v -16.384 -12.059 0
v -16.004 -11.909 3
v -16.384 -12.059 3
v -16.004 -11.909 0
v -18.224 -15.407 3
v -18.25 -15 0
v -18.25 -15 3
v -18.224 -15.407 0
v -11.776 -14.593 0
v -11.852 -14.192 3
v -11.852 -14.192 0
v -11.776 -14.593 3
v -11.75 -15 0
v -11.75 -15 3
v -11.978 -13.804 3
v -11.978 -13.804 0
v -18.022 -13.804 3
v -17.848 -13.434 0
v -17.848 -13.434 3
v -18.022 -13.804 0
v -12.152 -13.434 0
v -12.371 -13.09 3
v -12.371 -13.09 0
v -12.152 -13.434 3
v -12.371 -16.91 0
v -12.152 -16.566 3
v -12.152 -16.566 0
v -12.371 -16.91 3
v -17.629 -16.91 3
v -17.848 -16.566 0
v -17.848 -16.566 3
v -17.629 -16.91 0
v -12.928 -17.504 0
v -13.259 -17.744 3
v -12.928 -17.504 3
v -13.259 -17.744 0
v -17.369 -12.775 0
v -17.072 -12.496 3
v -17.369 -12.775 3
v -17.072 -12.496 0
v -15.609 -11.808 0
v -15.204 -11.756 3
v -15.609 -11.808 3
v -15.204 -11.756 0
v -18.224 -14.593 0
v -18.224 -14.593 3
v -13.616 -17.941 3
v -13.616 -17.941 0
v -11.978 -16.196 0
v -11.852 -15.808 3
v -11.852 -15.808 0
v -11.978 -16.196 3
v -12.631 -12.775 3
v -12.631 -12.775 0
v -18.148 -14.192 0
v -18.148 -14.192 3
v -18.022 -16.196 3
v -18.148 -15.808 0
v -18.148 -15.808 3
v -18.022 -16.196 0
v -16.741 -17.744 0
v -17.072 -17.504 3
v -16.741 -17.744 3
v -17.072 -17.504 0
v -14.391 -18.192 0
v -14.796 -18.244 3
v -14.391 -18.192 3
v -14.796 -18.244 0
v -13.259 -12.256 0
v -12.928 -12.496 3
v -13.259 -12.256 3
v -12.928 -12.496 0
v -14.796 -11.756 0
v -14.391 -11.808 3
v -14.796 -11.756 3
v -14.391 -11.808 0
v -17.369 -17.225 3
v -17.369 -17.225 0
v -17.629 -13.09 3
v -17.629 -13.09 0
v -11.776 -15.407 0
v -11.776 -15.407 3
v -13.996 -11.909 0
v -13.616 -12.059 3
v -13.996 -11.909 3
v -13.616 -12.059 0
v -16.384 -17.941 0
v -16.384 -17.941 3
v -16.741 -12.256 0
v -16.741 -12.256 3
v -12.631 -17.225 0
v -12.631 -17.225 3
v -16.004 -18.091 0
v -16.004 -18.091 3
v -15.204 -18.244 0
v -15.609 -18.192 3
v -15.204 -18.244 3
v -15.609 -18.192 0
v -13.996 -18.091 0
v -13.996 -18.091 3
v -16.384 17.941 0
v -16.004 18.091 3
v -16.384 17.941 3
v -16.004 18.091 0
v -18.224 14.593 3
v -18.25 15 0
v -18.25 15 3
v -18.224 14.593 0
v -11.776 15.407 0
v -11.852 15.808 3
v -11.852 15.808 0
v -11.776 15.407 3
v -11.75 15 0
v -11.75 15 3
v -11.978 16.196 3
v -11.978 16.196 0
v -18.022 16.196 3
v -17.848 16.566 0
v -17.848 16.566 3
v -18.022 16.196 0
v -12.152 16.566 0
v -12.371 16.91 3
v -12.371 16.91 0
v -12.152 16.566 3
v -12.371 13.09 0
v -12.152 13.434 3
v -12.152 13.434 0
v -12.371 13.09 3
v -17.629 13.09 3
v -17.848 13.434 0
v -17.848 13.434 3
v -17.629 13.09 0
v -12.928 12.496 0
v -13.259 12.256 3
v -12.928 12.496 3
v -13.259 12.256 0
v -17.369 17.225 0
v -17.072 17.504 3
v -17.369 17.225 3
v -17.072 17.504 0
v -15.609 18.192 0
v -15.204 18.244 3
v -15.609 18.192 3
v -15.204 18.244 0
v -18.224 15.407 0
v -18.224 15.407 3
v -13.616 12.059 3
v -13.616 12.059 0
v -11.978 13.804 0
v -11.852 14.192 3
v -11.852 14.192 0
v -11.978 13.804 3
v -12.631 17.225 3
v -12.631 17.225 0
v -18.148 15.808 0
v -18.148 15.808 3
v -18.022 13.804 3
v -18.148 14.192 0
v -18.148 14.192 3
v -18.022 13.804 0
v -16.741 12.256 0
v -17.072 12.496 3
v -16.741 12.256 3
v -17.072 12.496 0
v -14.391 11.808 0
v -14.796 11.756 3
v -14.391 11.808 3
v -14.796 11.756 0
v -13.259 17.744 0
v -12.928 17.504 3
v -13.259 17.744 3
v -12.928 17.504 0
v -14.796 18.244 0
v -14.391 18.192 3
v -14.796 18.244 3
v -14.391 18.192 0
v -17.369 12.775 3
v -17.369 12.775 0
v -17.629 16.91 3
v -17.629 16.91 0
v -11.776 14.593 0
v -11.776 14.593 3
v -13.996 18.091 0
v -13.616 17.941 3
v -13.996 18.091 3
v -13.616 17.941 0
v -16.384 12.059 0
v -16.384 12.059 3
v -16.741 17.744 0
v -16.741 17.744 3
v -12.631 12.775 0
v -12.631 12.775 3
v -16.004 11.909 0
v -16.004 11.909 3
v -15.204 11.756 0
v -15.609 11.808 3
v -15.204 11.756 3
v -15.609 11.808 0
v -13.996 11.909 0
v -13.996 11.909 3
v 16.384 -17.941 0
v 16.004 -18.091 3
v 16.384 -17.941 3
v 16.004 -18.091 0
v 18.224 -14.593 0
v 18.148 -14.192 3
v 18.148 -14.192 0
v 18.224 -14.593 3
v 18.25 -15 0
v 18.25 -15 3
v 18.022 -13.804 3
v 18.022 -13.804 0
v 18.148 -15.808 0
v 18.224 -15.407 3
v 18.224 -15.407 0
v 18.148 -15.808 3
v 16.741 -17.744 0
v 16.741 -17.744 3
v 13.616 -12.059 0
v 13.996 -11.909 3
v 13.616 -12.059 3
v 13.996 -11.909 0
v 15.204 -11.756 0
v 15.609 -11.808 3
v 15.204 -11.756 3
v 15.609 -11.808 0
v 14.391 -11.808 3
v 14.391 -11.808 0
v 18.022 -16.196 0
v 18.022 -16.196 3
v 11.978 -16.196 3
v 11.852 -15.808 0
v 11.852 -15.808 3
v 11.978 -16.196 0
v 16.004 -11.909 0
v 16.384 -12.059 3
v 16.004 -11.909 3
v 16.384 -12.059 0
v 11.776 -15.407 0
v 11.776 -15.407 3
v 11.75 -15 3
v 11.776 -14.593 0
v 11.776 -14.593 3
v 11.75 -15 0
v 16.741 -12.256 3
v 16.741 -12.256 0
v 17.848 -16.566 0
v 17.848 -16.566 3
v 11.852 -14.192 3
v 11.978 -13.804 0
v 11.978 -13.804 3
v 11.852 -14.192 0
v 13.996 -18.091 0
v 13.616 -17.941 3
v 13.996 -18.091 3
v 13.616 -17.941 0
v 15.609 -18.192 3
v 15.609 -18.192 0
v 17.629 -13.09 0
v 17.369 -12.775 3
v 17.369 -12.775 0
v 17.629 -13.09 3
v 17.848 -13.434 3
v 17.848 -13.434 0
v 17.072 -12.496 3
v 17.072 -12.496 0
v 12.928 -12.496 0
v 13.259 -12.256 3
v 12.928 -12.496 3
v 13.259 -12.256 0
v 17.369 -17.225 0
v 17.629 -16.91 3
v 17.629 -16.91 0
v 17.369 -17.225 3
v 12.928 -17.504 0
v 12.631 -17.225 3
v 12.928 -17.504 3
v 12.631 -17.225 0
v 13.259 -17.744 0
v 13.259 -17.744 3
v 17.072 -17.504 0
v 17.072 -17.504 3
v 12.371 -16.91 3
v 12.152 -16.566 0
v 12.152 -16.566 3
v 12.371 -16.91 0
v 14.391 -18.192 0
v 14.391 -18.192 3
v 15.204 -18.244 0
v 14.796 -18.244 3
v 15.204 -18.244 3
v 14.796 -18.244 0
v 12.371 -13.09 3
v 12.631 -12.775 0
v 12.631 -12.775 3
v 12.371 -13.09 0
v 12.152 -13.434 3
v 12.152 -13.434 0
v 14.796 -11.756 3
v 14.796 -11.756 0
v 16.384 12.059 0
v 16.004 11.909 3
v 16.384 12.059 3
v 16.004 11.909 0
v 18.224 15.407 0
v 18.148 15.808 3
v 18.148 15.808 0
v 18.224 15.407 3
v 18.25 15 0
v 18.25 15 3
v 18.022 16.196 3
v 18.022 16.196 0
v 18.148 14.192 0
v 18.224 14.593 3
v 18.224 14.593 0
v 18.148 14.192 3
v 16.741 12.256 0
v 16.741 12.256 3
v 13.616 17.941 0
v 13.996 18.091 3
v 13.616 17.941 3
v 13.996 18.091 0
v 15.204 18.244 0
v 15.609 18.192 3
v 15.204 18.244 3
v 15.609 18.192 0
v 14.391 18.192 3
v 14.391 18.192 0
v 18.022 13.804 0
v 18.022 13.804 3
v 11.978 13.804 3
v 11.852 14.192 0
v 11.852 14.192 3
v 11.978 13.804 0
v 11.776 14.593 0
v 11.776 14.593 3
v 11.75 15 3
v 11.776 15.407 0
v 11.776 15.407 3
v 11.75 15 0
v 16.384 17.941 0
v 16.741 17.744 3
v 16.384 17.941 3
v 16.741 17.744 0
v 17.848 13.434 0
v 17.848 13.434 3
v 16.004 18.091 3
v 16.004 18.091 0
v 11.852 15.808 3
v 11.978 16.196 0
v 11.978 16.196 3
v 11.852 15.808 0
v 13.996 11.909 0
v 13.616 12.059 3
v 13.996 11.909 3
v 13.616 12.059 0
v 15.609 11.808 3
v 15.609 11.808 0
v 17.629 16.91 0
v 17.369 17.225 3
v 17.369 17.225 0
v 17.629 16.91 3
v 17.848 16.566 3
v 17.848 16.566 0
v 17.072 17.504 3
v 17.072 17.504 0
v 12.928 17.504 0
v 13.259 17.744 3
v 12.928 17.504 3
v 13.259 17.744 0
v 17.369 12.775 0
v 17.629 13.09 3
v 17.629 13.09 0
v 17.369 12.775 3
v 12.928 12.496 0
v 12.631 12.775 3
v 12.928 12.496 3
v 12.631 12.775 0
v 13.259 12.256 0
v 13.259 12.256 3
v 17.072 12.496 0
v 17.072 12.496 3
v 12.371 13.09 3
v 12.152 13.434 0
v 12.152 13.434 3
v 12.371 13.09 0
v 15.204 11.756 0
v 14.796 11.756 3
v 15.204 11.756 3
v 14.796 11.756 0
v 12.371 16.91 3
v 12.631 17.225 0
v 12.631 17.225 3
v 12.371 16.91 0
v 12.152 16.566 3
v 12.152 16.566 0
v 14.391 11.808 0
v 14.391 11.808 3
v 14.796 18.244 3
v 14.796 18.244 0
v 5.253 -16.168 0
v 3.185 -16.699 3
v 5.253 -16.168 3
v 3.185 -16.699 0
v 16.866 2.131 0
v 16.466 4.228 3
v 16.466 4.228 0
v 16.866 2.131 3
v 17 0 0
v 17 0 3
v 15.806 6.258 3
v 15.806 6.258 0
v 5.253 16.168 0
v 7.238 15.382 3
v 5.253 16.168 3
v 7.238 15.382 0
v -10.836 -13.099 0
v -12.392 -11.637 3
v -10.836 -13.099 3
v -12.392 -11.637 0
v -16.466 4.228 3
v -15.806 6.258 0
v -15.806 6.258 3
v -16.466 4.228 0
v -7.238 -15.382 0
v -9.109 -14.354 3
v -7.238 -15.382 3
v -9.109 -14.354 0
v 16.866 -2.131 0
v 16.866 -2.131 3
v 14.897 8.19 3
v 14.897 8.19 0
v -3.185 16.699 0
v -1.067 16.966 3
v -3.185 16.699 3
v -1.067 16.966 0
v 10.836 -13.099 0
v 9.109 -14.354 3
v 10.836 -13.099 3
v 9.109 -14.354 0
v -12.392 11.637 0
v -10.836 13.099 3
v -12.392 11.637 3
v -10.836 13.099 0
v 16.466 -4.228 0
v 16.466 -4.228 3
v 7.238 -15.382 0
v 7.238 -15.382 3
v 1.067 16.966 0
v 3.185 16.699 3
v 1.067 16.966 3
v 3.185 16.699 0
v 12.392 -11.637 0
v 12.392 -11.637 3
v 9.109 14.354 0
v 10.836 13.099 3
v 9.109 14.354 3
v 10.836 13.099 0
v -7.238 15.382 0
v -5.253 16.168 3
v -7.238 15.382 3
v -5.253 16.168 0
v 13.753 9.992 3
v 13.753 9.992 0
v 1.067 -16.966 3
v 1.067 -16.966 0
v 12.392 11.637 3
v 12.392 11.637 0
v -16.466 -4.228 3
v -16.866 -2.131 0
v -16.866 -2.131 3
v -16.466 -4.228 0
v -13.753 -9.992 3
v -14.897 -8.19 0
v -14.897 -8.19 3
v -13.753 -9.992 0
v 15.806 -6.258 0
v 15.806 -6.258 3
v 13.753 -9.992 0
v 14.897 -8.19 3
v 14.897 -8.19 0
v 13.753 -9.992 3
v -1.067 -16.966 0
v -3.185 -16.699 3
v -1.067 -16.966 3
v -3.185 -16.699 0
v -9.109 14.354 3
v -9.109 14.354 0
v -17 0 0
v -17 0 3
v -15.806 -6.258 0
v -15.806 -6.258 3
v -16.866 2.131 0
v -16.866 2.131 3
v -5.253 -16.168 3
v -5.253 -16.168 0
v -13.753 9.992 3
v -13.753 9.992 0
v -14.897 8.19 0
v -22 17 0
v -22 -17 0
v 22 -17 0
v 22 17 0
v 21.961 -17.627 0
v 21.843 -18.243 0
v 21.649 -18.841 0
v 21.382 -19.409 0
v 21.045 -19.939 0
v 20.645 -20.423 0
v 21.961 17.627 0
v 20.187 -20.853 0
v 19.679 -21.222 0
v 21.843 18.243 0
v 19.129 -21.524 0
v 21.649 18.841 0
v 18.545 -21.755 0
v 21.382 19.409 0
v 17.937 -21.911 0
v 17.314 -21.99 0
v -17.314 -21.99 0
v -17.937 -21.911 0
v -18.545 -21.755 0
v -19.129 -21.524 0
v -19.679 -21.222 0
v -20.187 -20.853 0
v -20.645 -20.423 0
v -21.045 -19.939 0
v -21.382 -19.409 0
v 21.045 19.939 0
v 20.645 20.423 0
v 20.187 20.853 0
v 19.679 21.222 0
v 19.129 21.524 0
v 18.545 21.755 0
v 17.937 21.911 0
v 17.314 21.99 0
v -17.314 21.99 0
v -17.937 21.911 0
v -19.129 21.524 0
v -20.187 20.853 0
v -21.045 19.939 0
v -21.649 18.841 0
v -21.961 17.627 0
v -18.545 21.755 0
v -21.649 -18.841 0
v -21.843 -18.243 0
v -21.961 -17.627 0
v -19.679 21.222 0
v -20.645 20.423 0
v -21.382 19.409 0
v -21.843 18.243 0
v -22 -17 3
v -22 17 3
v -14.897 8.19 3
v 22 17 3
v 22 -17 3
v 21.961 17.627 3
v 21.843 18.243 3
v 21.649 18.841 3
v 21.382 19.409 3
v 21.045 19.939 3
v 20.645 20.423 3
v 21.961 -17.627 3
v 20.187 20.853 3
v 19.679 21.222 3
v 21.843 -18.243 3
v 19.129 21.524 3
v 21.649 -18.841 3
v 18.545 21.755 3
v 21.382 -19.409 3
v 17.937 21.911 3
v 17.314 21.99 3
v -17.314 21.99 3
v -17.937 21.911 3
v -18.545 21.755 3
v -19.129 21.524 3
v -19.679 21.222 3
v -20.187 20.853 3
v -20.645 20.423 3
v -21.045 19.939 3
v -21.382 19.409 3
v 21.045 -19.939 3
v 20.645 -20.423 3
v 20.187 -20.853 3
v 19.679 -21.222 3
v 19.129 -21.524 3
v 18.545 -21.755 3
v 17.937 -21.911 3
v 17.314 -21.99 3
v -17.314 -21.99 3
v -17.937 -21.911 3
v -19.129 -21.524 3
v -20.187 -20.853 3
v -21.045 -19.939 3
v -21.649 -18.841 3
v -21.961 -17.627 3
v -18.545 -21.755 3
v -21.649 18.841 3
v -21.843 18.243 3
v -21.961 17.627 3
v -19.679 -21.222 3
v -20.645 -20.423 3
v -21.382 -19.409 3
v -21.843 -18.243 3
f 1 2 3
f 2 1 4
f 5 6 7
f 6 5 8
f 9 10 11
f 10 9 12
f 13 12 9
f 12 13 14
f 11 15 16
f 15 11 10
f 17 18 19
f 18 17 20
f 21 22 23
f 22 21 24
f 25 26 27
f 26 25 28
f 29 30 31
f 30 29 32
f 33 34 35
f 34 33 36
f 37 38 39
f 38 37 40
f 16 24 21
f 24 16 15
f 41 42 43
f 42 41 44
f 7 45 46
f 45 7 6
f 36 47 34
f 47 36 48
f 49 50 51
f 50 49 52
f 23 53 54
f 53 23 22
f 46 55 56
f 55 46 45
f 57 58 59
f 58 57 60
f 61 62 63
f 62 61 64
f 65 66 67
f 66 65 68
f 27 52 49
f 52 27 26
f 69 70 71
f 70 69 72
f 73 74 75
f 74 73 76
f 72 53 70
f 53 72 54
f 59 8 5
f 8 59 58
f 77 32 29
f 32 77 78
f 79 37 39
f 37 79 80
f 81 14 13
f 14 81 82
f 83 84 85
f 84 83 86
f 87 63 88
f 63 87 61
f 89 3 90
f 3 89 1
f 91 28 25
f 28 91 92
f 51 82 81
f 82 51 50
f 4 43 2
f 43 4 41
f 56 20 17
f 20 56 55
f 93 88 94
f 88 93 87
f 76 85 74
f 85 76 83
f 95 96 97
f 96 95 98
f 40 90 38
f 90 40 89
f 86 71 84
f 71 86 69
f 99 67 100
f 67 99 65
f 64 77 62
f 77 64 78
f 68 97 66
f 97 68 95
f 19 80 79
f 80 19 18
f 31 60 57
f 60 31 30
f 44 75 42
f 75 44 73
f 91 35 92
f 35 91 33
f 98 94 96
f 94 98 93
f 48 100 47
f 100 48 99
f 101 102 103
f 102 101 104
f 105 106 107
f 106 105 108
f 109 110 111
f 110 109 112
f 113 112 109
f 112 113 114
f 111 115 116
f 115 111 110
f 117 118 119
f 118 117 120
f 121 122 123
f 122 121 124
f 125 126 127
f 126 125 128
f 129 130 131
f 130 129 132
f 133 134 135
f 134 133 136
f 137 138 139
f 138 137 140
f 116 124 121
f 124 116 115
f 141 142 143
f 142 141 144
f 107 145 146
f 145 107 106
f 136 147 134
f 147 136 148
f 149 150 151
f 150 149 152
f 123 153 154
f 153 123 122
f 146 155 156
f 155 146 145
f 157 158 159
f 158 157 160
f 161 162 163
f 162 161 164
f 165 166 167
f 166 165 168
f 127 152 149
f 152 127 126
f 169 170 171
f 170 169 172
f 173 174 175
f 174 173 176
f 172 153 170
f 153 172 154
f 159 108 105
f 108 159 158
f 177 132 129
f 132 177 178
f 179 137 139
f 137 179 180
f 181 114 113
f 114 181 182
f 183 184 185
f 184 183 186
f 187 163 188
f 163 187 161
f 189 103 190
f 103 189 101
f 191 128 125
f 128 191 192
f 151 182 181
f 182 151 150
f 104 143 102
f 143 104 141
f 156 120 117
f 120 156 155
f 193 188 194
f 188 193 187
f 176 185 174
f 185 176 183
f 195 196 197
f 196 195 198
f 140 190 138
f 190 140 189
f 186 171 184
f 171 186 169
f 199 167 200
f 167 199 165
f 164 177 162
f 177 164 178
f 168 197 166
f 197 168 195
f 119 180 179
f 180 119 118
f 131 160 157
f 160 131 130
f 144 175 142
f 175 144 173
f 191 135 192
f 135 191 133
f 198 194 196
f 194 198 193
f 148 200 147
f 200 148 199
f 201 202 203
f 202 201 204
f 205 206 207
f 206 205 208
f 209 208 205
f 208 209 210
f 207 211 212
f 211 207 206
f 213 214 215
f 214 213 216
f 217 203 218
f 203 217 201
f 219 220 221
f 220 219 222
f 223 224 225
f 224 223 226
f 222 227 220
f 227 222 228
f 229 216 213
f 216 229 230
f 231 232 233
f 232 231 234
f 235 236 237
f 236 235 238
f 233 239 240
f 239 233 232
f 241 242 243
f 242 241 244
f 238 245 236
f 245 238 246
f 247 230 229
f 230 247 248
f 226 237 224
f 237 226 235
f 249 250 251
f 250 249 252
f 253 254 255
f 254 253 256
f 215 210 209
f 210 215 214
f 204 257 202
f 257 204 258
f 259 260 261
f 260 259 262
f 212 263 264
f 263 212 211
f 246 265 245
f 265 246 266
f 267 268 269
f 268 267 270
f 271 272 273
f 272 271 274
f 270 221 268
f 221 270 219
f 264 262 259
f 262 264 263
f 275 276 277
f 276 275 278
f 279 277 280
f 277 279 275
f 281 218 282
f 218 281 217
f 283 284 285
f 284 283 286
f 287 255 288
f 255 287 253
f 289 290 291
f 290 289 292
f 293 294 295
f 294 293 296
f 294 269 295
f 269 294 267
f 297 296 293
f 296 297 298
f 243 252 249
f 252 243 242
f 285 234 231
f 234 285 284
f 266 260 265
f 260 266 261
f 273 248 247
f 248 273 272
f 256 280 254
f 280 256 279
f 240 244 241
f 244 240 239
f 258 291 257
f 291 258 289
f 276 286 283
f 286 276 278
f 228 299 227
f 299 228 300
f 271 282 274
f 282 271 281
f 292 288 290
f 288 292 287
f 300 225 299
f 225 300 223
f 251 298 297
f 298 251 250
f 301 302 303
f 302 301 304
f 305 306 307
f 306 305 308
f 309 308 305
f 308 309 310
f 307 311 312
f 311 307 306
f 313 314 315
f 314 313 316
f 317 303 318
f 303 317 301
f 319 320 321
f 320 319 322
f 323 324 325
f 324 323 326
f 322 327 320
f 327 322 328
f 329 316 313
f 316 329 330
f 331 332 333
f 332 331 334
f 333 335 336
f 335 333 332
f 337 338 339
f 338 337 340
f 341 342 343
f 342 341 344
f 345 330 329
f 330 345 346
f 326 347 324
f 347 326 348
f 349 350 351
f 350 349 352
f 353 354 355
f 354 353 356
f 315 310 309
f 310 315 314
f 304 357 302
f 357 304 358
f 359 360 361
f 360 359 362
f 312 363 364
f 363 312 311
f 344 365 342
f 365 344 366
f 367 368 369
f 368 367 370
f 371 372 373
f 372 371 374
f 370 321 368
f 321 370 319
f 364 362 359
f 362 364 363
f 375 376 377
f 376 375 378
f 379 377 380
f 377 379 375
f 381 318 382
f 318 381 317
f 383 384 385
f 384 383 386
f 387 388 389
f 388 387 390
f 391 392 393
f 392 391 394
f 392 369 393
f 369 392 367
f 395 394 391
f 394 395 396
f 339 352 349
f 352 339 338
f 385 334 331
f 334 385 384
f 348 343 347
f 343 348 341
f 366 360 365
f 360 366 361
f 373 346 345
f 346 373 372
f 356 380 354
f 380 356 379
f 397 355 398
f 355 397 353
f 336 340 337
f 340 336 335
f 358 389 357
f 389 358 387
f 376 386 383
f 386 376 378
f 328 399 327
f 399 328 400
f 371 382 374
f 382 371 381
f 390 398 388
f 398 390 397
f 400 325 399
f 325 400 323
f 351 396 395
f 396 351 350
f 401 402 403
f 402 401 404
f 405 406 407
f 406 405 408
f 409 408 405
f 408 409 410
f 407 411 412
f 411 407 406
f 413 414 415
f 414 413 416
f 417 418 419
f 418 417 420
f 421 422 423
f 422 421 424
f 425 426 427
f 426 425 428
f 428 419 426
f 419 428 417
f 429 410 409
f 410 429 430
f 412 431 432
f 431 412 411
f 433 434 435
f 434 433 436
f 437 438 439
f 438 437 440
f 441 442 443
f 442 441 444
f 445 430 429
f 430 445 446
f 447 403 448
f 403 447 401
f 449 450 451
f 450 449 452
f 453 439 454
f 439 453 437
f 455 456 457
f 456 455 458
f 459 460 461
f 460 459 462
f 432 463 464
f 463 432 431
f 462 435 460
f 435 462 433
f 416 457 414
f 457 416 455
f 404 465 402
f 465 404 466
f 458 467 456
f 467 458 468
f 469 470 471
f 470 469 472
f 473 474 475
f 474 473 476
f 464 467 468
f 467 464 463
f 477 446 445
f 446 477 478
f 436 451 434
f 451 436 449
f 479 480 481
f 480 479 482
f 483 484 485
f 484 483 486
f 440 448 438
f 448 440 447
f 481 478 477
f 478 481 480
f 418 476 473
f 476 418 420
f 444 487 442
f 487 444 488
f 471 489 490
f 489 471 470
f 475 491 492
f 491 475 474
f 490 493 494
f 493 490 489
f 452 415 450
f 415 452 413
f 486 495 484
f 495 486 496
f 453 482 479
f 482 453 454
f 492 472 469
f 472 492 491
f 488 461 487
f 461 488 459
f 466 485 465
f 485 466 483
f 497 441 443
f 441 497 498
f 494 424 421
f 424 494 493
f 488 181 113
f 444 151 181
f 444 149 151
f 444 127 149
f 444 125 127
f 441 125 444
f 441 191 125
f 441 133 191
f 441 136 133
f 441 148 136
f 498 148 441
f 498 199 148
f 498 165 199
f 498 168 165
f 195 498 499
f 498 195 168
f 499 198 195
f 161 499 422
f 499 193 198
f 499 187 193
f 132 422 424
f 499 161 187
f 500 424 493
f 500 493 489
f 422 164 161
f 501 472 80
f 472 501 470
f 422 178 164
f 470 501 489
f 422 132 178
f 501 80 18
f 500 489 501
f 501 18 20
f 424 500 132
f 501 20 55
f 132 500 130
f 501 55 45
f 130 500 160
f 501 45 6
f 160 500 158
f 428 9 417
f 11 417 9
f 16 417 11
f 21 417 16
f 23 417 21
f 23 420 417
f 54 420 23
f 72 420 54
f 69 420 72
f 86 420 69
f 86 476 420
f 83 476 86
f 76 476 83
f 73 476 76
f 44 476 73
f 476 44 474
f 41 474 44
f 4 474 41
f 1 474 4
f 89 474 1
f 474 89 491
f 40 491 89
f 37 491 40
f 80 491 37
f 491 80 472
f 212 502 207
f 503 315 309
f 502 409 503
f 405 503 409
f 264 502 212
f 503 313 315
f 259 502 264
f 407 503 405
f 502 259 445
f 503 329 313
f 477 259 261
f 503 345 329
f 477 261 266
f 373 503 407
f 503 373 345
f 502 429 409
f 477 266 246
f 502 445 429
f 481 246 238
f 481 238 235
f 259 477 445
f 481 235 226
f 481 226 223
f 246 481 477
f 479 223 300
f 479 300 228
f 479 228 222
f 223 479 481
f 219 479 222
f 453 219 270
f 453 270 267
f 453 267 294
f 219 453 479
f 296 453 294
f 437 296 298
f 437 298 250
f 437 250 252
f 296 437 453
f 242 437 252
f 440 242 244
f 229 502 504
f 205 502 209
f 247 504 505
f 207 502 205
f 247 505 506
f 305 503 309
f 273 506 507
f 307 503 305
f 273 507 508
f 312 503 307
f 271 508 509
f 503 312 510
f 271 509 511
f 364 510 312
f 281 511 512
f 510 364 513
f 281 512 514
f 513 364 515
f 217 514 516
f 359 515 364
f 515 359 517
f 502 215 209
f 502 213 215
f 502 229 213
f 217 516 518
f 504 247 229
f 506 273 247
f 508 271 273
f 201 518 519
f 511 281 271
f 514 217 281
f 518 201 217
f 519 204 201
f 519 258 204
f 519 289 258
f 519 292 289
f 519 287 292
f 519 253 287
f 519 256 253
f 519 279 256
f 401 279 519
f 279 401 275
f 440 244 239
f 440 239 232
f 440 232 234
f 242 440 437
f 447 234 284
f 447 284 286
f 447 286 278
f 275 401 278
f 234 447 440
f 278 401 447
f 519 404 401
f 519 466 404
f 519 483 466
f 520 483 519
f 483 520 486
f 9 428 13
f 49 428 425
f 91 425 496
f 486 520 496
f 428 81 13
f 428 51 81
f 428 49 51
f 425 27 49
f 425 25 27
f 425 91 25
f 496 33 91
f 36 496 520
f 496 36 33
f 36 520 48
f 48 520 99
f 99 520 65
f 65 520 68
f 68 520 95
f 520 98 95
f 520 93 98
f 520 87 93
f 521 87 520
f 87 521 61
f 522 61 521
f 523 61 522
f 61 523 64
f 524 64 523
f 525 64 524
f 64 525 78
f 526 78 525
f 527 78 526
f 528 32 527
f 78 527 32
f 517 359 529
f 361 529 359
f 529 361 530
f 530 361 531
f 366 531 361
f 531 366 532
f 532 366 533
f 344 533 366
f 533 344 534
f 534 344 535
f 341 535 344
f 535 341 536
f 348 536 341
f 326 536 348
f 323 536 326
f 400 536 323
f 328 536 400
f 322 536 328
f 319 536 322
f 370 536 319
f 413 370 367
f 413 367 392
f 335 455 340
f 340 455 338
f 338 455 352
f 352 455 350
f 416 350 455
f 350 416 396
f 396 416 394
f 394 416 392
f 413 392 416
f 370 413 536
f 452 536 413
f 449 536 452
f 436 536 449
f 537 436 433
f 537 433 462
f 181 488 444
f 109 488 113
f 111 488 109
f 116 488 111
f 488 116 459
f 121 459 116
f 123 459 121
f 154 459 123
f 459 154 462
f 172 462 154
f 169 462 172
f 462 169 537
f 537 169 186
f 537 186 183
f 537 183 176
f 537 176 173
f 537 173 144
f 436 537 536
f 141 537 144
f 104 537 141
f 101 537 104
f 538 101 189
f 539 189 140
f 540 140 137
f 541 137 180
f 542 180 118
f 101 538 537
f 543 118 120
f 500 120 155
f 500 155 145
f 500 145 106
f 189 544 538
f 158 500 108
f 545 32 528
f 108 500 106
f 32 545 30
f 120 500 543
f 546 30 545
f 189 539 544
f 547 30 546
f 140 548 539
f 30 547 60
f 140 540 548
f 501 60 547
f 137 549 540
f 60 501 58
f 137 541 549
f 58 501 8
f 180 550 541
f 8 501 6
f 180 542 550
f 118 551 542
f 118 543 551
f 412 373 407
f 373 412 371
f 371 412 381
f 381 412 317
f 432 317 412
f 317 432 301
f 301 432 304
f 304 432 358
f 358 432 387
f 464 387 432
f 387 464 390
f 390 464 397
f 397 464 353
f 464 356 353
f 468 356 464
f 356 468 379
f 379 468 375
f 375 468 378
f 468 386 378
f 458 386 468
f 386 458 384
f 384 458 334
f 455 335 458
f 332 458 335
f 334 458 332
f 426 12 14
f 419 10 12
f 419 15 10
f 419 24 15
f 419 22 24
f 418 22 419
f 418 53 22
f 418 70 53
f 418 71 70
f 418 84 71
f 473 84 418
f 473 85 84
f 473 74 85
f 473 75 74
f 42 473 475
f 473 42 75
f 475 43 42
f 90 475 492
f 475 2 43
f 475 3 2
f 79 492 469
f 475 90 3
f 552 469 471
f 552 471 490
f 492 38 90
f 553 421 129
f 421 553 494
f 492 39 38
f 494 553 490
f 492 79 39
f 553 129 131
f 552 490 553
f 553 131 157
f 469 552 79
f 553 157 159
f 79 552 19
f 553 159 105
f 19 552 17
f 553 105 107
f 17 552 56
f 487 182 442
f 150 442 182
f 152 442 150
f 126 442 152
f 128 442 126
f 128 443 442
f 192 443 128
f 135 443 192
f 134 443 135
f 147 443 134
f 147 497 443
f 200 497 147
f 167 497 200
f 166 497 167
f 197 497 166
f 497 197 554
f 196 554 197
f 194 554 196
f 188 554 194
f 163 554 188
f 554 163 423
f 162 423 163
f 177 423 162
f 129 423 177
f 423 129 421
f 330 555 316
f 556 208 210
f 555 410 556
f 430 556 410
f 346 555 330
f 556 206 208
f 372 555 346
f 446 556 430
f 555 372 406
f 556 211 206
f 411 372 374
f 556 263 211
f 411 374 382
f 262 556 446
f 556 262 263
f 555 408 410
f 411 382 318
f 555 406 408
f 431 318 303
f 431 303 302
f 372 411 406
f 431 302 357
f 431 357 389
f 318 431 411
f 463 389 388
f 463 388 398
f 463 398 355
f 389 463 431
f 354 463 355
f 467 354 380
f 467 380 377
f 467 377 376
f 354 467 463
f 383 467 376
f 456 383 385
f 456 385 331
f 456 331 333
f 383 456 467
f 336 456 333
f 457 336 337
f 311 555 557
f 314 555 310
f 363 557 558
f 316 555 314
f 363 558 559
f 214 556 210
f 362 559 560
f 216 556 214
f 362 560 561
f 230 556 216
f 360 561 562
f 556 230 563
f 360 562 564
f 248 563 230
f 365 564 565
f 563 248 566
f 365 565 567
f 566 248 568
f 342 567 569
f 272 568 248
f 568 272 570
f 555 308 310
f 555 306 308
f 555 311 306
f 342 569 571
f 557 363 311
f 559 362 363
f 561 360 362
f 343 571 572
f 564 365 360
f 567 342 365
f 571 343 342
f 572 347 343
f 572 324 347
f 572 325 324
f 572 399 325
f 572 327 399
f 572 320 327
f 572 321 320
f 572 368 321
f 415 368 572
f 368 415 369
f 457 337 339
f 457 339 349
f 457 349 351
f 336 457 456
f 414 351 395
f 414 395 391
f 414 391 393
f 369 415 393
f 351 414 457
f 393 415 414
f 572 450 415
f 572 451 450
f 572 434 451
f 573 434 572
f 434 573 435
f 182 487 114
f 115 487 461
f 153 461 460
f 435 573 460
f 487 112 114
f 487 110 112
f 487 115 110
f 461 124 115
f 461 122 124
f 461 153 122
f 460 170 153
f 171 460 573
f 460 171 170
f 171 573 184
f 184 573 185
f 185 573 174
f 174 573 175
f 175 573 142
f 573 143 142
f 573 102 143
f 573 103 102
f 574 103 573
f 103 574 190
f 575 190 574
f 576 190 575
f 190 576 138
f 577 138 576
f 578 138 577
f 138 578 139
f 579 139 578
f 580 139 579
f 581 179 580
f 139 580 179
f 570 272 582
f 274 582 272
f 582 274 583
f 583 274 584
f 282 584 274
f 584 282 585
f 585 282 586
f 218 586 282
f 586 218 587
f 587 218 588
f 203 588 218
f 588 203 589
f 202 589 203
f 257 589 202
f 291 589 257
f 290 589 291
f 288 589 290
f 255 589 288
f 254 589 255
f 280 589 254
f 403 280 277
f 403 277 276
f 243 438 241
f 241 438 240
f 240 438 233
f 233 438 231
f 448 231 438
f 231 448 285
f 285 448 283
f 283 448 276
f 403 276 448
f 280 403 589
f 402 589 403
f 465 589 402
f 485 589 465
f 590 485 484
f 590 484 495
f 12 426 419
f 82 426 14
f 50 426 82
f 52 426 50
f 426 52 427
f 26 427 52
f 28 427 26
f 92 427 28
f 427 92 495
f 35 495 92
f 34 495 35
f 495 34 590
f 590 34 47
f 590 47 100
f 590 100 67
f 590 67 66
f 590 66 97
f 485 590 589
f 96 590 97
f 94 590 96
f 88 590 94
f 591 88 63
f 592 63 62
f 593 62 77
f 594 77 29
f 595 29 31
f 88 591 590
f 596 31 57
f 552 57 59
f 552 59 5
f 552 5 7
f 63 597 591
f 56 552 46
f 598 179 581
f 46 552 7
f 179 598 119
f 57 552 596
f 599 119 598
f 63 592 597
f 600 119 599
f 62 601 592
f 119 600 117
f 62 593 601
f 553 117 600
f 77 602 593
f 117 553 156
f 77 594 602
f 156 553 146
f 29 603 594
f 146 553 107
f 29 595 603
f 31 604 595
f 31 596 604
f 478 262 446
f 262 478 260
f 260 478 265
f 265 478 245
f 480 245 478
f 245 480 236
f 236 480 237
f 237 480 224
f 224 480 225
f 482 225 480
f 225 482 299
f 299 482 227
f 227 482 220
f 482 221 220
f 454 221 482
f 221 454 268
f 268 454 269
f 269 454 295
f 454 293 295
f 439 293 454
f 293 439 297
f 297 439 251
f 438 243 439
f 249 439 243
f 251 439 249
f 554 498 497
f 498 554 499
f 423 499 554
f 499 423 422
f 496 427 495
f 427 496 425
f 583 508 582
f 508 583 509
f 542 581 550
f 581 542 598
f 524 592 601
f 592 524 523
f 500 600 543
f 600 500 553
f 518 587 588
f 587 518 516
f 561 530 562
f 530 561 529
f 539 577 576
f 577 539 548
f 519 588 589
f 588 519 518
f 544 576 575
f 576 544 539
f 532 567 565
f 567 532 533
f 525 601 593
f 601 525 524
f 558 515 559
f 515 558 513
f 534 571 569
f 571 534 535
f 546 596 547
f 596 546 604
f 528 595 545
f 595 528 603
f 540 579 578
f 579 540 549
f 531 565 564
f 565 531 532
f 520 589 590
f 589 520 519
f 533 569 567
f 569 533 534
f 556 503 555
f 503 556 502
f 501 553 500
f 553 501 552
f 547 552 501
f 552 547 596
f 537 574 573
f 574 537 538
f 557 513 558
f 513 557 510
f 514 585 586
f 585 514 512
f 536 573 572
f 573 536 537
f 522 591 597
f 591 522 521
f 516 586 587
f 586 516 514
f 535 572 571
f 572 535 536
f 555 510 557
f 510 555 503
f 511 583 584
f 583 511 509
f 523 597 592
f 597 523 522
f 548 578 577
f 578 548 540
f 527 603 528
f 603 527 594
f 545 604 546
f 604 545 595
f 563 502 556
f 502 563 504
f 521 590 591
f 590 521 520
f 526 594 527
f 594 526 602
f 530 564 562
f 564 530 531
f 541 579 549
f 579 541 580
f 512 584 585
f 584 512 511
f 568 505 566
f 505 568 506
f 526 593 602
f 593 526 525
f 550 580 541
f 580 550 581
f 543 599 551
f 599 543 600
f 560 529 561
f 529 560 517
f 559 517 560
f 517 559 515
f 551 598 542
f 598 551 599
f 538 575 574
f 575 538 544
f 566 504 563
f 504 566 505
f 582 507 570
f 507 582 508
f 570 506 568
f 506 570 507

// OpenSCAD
$fn = 50;

difference() {
	union() {
		hull() {
			translate(v = [-17.0, 17.0, 0]) {
				cylinder(h = 3, r = 5);
			}
			translate(v = [17.0, 17.0, 0]) {
				cylinder(h = 3, r = 5);
			}
			translate(v = [-17.0, -17.0, 0]) {
				cylinder(h = 3, r = 5);
			}
			translate(v = [17.0, -17.0, 0]) {
				cylinder(h = 3, r = 5);
			}
		}
	}
	union() {
		translate(v = [-15.0, -15.0, -100.0]) {
			cylinder(h = 200, r = 3.25);
		}
		translate(v = [-15.0, 15.0, -100.0]) {
			cylinder(h = 200, r = 3.25);
		}
		translate(v = [15.0, -15.0, -100.0]) {
			cylinder(h = 200, r = 3.25);
		}
		translate(v = [15.0, 15.0, -100.0]) {
			cylinder(h = 200, r = 3.25);
		}
		translate(v = [-15.0, -15.0, -100.0]) {
			cylinder(h = 200, r = 1.8);
		}
		translate(v = [-15.0, 15.0, -100.0]) {
			cylinder(h = 200, r = 1.8);
		}
		translate(v = [15.0, -15.0, -100.0]) {
			cylinder(h = 200, r = 1.8);
		}
		translate(v = [15.0, 15.0, -100.0]) {
			cylinder(h = 200, r = 1.8);
		}
		cylinder(h = 3, r = 17.0);
	}
}
